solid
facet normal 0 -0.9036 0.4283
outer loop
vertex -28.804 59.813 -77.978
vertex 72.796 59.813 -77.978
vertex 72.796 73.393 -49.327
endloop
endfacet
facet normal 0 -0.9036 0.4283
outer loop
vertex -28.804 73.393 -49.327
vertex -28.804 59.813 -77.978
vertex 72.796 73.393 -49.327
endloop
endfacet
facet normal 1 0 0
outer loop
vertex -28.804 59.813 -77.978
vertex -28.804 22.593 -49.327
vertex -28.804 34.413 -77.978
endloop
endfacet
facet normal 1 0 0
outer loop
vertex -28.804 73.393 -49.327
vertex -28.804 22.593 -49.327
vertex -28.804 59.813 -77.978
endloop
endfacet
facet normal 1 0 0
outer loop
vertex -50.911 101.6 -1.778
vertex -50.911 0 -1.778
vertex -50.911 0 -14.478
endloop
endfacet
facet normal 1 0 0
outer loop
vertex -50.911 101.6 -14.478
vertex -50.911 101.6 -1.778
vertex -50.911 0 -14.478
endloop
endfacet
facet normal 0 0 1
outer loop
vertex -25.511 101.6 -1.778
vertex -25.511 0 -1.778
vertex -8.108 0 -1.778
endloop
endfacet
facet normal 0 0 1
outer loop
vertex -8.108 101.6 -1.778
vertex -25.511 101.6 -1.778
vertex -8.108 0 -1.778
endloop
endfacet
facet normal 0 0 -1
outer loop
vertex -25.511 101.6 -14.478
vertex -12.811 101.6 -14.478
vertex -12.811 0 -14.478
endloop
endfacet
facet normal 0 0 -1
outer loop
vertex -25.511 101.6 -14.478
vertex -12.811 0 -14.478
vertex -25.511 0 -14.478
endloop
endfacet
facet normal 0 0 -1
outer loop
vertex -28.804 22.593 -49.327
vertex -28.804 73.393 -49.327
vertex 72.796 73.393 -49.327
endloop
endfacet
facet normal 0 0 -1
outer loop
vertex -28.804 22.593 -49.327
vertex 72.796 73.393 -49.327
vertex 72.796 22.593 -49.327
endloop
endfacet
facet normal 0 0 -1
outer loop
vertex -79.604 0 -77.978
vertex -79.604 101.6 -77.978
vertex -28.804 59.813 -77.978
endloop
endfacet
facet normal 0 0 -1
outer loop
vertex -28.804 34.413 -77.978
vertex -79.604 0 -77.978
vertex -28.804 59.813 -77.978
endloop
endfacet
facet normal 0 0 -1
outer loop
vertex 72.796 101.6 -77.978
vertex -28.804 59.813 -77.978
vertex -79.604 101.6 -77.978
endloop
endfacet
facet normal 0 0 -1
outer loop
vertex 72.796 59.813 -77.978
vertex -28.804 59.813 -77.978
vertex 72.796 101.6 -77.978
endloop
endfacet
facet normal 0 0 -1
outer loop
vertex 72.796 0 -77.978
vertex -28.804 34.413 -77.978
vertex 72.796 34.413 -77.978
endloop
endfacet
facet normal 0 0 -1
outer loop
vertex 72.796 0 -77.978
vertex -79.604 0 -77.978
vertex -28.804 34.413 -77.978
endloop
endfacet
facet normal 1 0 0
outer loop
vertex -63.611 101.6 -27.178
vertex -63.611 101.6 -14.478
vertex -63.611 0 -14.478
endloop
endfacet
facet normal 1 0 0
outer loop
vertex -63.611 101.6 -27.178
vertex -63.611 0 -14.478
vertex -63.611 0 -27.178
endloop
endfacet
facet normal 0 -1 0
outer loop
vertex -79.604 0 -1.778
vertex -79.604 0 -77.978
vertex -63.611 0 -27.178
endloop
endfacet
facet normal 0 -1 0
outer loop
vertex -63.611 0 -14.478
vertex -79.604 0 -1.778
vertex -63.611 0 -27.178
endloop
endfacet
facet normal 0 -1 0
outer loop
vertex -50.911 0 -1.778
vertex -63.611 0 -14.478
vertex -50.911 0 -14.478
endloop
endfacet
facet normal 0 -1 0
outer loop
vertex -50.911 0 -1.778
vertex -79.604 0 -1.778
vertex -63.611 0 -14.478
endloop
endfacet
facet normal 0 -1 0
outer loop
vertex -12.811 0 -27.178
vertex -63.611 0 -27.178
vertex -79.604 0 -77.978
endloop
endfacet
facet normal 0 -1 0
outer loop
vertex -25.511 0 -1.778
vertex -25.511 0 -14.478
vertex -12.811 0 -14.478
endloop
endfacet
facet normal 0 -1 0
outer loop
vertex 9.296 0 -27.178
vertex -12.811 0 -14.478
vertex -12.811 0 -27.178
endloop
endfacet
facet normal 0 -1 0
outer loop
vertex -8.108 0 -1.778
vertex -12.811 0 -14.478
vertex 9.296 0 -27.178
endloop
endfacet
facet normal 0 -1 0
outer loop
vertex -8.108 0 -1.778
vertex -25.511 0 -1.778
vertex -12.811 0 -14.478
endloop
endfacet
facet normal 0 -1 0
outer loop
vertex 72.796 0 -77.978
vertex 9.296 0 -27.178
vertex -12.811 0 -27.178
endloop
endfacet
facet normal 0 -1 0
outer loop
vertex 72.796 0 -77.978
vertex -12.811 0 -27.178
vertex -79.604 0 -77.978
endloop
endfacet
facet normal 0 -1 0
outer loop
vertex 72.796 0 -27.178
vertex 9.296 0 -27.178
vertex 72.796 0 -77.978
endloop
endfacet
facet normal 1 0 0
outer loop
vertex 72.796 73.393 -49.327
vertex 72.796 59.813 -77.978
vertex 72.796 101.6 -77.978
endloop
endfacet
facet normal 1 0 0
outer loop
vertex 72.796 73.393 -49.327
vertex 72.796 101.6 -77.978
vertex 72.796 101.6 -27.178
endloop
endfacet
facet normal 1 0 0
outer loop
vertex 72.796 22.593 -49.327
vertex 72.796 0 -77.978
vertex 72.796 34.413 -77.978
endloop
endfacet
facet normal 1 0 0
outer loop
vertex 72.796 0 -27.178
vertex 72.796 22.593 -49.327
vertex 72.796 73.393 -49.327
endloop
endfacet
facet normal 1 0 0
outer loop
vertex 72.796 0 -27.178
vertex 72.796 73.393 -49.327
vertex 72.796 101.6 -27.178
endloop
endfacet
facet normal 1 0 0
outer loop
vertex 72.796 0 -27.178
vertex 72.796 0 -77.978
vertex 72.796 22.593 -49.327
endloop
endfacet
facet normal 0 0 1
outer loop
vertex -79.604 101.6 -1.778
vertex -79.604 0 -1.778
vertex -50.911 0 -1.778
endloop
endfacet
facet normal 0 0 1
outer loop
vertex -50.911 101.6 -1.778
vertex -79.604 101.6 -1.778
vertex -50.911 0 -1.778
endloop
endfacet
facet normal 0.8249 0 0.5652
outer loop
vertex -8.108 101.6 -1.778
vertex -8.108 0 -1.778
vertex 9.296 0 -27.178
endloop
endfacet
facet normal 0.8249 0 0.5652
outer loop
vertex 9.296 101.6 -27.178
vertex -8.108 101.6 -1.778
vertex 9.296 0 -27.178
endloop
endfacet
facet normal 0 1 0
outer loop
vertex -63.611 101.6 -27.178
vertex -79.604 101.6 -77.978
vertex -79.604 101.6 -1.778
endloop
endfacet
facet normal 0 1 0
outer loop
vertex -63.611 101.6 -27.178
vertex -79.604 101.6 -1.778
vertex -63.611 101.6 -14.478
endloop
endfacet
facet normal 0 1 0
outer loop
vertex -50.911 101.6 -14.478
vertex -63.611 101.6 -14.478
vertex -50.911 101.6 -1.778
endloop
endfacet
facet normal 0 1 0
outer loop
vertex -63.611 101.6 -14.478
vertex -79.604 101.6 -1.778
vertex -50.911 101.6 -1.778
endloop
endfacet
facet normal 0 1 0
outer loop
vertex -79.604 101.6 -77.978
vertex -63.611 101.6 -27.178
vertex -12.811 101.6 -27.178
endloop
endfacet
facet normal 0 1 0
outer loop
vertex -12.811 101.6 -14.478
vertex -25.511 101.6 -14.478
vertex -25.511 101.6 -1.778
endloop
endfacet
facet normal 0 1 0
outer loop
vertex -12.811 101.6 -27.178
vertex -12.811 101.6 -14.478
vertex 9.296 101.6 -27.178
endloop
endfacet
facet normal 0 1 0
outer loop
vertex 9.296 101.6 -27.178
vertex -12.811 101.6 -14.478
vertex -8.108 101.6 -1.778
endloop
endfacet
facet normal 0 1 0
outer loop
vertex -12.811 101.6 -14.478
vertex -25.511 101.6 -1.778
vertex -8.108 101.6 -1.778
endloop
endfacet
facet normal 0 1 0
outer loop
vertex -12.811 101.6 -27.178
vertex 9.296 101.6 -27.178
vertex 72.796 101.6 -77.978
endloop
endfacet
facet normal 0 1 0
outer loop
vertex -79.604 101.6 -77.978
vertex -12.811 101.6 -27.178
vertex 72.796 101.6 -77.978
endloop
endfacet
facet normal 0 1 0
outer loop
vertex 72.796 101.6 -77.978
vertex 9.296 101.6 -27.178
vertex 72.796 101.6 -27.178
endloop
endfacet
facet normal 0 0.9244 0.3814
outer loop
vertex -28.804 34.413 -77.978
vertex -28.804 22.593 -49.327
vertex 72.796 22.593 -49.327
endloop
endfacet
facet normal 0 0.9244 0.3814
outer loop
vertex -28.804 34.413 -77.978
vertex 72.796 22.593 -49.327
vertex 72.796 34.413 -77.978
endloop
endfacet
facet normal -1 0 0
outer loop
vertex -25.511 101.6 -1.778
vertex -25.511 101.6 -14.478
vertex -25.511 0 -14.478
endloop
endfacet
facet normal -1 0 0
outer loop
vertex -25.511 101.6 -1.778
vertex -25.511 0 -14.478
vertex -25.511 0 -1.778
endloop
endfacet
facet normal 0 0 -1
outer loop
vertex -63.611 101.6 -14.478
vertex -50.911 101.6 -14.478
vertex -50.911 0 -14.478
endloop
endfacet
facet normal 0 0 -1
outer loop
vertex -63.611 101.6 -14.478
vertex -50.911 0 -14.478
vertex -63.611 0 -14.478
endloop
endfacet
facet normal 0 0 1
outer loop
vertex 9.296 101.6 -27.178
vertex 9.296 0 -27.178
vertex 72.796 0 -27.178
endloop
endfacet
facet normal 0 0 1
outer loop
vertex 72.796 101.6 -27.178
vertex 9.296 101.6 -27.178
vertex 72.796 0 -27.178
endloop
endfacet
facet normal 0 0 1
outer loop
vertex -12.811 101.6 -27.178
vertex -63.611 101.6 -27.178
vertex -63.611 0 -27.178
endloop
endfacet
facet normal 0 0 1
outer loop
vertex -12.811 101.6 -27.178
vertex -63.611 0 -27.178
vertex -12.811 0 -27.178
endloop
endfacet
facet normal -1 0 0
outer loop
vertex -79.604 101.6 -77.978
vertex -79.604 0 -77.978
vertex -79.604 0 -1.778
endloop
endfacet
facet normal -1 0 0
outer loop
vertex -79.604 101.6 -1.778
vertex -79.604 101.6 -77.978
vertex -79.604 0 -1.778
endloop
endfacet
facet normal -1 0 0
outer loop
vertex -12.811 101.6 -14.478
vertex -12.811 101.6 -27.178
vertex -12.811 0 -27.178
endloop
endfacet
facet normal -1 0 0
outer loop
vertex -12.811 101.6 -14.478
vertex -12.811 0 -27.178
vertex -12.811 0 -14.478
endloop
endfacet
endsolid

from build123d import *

# Parameters (mm, degrees)
F0_W     = 152.4
F0_H     = 76.2
F1_DEPTH = 101.6
F3_DEPTH = 101.6
F5_DEPTH = 101.6
F6_W     = 63.5
F6_H     = 25.4
F7_DEPTH = 101.6
F9_DEPTH = 101.6


with BuildPart() as f1:
    # F0 (on Front) → F1 (new body)
    with BuildSketch(Plane.XZ):
        with Locations((-3.404423, -39.877999)):
            Rectangle(F0_W, F0_H)
    extrude(amount=-F1_DEPTH)

    # F2 (on face) → F3 (cut)
    with BuildSketch(Plane.XZ):
        Polygon((-25.510689, -1.777999), (-50.910689, -1.777999), (-50.910689, -14.477999), (-63.610689, -14.477999), (-63.610689, -27.177999), (-12.810689, -27.177999), (-12.810689, -14.477999), (-25.510689, -14.477999), align=None)
    extrude(amount=-F3_DEPTH, mode=Mode.SUBTRACT)

    # F4 (on face) → F5 (cut)
    with BuildSketch(Plane.YZ.offset(72.795577)):
        Polygon((73.393088, -49.326587), (22.593088, -49.326587), (34.413401, -77.977999), (59.813401, -77.977999), align=None)
    extrude(amount=-F5_DEPTH, mode=Mode.SUBTRACT)

    # F6 (on face) → F7 (cut)
    with BuildSketch(Plane.XZ):
        with Locations((41.045577, -14.477999)):
            Rectangle(F6_W, F6_H)
    extrude(amount=-F7_DEPTH, mode=Mode.SUBTRACT)

    # F8 (on face) → F9 (cut)
    with BuildSketch(Plane.XZ):
        Polygon((9.295577, -1.777999), (-8.107556, -1.777999), (9.295577, -27.177999), align=None)
    extrude(amount=-F9_DEPTH, mode=Mode.SUBTRACT)


solid = f1.part
